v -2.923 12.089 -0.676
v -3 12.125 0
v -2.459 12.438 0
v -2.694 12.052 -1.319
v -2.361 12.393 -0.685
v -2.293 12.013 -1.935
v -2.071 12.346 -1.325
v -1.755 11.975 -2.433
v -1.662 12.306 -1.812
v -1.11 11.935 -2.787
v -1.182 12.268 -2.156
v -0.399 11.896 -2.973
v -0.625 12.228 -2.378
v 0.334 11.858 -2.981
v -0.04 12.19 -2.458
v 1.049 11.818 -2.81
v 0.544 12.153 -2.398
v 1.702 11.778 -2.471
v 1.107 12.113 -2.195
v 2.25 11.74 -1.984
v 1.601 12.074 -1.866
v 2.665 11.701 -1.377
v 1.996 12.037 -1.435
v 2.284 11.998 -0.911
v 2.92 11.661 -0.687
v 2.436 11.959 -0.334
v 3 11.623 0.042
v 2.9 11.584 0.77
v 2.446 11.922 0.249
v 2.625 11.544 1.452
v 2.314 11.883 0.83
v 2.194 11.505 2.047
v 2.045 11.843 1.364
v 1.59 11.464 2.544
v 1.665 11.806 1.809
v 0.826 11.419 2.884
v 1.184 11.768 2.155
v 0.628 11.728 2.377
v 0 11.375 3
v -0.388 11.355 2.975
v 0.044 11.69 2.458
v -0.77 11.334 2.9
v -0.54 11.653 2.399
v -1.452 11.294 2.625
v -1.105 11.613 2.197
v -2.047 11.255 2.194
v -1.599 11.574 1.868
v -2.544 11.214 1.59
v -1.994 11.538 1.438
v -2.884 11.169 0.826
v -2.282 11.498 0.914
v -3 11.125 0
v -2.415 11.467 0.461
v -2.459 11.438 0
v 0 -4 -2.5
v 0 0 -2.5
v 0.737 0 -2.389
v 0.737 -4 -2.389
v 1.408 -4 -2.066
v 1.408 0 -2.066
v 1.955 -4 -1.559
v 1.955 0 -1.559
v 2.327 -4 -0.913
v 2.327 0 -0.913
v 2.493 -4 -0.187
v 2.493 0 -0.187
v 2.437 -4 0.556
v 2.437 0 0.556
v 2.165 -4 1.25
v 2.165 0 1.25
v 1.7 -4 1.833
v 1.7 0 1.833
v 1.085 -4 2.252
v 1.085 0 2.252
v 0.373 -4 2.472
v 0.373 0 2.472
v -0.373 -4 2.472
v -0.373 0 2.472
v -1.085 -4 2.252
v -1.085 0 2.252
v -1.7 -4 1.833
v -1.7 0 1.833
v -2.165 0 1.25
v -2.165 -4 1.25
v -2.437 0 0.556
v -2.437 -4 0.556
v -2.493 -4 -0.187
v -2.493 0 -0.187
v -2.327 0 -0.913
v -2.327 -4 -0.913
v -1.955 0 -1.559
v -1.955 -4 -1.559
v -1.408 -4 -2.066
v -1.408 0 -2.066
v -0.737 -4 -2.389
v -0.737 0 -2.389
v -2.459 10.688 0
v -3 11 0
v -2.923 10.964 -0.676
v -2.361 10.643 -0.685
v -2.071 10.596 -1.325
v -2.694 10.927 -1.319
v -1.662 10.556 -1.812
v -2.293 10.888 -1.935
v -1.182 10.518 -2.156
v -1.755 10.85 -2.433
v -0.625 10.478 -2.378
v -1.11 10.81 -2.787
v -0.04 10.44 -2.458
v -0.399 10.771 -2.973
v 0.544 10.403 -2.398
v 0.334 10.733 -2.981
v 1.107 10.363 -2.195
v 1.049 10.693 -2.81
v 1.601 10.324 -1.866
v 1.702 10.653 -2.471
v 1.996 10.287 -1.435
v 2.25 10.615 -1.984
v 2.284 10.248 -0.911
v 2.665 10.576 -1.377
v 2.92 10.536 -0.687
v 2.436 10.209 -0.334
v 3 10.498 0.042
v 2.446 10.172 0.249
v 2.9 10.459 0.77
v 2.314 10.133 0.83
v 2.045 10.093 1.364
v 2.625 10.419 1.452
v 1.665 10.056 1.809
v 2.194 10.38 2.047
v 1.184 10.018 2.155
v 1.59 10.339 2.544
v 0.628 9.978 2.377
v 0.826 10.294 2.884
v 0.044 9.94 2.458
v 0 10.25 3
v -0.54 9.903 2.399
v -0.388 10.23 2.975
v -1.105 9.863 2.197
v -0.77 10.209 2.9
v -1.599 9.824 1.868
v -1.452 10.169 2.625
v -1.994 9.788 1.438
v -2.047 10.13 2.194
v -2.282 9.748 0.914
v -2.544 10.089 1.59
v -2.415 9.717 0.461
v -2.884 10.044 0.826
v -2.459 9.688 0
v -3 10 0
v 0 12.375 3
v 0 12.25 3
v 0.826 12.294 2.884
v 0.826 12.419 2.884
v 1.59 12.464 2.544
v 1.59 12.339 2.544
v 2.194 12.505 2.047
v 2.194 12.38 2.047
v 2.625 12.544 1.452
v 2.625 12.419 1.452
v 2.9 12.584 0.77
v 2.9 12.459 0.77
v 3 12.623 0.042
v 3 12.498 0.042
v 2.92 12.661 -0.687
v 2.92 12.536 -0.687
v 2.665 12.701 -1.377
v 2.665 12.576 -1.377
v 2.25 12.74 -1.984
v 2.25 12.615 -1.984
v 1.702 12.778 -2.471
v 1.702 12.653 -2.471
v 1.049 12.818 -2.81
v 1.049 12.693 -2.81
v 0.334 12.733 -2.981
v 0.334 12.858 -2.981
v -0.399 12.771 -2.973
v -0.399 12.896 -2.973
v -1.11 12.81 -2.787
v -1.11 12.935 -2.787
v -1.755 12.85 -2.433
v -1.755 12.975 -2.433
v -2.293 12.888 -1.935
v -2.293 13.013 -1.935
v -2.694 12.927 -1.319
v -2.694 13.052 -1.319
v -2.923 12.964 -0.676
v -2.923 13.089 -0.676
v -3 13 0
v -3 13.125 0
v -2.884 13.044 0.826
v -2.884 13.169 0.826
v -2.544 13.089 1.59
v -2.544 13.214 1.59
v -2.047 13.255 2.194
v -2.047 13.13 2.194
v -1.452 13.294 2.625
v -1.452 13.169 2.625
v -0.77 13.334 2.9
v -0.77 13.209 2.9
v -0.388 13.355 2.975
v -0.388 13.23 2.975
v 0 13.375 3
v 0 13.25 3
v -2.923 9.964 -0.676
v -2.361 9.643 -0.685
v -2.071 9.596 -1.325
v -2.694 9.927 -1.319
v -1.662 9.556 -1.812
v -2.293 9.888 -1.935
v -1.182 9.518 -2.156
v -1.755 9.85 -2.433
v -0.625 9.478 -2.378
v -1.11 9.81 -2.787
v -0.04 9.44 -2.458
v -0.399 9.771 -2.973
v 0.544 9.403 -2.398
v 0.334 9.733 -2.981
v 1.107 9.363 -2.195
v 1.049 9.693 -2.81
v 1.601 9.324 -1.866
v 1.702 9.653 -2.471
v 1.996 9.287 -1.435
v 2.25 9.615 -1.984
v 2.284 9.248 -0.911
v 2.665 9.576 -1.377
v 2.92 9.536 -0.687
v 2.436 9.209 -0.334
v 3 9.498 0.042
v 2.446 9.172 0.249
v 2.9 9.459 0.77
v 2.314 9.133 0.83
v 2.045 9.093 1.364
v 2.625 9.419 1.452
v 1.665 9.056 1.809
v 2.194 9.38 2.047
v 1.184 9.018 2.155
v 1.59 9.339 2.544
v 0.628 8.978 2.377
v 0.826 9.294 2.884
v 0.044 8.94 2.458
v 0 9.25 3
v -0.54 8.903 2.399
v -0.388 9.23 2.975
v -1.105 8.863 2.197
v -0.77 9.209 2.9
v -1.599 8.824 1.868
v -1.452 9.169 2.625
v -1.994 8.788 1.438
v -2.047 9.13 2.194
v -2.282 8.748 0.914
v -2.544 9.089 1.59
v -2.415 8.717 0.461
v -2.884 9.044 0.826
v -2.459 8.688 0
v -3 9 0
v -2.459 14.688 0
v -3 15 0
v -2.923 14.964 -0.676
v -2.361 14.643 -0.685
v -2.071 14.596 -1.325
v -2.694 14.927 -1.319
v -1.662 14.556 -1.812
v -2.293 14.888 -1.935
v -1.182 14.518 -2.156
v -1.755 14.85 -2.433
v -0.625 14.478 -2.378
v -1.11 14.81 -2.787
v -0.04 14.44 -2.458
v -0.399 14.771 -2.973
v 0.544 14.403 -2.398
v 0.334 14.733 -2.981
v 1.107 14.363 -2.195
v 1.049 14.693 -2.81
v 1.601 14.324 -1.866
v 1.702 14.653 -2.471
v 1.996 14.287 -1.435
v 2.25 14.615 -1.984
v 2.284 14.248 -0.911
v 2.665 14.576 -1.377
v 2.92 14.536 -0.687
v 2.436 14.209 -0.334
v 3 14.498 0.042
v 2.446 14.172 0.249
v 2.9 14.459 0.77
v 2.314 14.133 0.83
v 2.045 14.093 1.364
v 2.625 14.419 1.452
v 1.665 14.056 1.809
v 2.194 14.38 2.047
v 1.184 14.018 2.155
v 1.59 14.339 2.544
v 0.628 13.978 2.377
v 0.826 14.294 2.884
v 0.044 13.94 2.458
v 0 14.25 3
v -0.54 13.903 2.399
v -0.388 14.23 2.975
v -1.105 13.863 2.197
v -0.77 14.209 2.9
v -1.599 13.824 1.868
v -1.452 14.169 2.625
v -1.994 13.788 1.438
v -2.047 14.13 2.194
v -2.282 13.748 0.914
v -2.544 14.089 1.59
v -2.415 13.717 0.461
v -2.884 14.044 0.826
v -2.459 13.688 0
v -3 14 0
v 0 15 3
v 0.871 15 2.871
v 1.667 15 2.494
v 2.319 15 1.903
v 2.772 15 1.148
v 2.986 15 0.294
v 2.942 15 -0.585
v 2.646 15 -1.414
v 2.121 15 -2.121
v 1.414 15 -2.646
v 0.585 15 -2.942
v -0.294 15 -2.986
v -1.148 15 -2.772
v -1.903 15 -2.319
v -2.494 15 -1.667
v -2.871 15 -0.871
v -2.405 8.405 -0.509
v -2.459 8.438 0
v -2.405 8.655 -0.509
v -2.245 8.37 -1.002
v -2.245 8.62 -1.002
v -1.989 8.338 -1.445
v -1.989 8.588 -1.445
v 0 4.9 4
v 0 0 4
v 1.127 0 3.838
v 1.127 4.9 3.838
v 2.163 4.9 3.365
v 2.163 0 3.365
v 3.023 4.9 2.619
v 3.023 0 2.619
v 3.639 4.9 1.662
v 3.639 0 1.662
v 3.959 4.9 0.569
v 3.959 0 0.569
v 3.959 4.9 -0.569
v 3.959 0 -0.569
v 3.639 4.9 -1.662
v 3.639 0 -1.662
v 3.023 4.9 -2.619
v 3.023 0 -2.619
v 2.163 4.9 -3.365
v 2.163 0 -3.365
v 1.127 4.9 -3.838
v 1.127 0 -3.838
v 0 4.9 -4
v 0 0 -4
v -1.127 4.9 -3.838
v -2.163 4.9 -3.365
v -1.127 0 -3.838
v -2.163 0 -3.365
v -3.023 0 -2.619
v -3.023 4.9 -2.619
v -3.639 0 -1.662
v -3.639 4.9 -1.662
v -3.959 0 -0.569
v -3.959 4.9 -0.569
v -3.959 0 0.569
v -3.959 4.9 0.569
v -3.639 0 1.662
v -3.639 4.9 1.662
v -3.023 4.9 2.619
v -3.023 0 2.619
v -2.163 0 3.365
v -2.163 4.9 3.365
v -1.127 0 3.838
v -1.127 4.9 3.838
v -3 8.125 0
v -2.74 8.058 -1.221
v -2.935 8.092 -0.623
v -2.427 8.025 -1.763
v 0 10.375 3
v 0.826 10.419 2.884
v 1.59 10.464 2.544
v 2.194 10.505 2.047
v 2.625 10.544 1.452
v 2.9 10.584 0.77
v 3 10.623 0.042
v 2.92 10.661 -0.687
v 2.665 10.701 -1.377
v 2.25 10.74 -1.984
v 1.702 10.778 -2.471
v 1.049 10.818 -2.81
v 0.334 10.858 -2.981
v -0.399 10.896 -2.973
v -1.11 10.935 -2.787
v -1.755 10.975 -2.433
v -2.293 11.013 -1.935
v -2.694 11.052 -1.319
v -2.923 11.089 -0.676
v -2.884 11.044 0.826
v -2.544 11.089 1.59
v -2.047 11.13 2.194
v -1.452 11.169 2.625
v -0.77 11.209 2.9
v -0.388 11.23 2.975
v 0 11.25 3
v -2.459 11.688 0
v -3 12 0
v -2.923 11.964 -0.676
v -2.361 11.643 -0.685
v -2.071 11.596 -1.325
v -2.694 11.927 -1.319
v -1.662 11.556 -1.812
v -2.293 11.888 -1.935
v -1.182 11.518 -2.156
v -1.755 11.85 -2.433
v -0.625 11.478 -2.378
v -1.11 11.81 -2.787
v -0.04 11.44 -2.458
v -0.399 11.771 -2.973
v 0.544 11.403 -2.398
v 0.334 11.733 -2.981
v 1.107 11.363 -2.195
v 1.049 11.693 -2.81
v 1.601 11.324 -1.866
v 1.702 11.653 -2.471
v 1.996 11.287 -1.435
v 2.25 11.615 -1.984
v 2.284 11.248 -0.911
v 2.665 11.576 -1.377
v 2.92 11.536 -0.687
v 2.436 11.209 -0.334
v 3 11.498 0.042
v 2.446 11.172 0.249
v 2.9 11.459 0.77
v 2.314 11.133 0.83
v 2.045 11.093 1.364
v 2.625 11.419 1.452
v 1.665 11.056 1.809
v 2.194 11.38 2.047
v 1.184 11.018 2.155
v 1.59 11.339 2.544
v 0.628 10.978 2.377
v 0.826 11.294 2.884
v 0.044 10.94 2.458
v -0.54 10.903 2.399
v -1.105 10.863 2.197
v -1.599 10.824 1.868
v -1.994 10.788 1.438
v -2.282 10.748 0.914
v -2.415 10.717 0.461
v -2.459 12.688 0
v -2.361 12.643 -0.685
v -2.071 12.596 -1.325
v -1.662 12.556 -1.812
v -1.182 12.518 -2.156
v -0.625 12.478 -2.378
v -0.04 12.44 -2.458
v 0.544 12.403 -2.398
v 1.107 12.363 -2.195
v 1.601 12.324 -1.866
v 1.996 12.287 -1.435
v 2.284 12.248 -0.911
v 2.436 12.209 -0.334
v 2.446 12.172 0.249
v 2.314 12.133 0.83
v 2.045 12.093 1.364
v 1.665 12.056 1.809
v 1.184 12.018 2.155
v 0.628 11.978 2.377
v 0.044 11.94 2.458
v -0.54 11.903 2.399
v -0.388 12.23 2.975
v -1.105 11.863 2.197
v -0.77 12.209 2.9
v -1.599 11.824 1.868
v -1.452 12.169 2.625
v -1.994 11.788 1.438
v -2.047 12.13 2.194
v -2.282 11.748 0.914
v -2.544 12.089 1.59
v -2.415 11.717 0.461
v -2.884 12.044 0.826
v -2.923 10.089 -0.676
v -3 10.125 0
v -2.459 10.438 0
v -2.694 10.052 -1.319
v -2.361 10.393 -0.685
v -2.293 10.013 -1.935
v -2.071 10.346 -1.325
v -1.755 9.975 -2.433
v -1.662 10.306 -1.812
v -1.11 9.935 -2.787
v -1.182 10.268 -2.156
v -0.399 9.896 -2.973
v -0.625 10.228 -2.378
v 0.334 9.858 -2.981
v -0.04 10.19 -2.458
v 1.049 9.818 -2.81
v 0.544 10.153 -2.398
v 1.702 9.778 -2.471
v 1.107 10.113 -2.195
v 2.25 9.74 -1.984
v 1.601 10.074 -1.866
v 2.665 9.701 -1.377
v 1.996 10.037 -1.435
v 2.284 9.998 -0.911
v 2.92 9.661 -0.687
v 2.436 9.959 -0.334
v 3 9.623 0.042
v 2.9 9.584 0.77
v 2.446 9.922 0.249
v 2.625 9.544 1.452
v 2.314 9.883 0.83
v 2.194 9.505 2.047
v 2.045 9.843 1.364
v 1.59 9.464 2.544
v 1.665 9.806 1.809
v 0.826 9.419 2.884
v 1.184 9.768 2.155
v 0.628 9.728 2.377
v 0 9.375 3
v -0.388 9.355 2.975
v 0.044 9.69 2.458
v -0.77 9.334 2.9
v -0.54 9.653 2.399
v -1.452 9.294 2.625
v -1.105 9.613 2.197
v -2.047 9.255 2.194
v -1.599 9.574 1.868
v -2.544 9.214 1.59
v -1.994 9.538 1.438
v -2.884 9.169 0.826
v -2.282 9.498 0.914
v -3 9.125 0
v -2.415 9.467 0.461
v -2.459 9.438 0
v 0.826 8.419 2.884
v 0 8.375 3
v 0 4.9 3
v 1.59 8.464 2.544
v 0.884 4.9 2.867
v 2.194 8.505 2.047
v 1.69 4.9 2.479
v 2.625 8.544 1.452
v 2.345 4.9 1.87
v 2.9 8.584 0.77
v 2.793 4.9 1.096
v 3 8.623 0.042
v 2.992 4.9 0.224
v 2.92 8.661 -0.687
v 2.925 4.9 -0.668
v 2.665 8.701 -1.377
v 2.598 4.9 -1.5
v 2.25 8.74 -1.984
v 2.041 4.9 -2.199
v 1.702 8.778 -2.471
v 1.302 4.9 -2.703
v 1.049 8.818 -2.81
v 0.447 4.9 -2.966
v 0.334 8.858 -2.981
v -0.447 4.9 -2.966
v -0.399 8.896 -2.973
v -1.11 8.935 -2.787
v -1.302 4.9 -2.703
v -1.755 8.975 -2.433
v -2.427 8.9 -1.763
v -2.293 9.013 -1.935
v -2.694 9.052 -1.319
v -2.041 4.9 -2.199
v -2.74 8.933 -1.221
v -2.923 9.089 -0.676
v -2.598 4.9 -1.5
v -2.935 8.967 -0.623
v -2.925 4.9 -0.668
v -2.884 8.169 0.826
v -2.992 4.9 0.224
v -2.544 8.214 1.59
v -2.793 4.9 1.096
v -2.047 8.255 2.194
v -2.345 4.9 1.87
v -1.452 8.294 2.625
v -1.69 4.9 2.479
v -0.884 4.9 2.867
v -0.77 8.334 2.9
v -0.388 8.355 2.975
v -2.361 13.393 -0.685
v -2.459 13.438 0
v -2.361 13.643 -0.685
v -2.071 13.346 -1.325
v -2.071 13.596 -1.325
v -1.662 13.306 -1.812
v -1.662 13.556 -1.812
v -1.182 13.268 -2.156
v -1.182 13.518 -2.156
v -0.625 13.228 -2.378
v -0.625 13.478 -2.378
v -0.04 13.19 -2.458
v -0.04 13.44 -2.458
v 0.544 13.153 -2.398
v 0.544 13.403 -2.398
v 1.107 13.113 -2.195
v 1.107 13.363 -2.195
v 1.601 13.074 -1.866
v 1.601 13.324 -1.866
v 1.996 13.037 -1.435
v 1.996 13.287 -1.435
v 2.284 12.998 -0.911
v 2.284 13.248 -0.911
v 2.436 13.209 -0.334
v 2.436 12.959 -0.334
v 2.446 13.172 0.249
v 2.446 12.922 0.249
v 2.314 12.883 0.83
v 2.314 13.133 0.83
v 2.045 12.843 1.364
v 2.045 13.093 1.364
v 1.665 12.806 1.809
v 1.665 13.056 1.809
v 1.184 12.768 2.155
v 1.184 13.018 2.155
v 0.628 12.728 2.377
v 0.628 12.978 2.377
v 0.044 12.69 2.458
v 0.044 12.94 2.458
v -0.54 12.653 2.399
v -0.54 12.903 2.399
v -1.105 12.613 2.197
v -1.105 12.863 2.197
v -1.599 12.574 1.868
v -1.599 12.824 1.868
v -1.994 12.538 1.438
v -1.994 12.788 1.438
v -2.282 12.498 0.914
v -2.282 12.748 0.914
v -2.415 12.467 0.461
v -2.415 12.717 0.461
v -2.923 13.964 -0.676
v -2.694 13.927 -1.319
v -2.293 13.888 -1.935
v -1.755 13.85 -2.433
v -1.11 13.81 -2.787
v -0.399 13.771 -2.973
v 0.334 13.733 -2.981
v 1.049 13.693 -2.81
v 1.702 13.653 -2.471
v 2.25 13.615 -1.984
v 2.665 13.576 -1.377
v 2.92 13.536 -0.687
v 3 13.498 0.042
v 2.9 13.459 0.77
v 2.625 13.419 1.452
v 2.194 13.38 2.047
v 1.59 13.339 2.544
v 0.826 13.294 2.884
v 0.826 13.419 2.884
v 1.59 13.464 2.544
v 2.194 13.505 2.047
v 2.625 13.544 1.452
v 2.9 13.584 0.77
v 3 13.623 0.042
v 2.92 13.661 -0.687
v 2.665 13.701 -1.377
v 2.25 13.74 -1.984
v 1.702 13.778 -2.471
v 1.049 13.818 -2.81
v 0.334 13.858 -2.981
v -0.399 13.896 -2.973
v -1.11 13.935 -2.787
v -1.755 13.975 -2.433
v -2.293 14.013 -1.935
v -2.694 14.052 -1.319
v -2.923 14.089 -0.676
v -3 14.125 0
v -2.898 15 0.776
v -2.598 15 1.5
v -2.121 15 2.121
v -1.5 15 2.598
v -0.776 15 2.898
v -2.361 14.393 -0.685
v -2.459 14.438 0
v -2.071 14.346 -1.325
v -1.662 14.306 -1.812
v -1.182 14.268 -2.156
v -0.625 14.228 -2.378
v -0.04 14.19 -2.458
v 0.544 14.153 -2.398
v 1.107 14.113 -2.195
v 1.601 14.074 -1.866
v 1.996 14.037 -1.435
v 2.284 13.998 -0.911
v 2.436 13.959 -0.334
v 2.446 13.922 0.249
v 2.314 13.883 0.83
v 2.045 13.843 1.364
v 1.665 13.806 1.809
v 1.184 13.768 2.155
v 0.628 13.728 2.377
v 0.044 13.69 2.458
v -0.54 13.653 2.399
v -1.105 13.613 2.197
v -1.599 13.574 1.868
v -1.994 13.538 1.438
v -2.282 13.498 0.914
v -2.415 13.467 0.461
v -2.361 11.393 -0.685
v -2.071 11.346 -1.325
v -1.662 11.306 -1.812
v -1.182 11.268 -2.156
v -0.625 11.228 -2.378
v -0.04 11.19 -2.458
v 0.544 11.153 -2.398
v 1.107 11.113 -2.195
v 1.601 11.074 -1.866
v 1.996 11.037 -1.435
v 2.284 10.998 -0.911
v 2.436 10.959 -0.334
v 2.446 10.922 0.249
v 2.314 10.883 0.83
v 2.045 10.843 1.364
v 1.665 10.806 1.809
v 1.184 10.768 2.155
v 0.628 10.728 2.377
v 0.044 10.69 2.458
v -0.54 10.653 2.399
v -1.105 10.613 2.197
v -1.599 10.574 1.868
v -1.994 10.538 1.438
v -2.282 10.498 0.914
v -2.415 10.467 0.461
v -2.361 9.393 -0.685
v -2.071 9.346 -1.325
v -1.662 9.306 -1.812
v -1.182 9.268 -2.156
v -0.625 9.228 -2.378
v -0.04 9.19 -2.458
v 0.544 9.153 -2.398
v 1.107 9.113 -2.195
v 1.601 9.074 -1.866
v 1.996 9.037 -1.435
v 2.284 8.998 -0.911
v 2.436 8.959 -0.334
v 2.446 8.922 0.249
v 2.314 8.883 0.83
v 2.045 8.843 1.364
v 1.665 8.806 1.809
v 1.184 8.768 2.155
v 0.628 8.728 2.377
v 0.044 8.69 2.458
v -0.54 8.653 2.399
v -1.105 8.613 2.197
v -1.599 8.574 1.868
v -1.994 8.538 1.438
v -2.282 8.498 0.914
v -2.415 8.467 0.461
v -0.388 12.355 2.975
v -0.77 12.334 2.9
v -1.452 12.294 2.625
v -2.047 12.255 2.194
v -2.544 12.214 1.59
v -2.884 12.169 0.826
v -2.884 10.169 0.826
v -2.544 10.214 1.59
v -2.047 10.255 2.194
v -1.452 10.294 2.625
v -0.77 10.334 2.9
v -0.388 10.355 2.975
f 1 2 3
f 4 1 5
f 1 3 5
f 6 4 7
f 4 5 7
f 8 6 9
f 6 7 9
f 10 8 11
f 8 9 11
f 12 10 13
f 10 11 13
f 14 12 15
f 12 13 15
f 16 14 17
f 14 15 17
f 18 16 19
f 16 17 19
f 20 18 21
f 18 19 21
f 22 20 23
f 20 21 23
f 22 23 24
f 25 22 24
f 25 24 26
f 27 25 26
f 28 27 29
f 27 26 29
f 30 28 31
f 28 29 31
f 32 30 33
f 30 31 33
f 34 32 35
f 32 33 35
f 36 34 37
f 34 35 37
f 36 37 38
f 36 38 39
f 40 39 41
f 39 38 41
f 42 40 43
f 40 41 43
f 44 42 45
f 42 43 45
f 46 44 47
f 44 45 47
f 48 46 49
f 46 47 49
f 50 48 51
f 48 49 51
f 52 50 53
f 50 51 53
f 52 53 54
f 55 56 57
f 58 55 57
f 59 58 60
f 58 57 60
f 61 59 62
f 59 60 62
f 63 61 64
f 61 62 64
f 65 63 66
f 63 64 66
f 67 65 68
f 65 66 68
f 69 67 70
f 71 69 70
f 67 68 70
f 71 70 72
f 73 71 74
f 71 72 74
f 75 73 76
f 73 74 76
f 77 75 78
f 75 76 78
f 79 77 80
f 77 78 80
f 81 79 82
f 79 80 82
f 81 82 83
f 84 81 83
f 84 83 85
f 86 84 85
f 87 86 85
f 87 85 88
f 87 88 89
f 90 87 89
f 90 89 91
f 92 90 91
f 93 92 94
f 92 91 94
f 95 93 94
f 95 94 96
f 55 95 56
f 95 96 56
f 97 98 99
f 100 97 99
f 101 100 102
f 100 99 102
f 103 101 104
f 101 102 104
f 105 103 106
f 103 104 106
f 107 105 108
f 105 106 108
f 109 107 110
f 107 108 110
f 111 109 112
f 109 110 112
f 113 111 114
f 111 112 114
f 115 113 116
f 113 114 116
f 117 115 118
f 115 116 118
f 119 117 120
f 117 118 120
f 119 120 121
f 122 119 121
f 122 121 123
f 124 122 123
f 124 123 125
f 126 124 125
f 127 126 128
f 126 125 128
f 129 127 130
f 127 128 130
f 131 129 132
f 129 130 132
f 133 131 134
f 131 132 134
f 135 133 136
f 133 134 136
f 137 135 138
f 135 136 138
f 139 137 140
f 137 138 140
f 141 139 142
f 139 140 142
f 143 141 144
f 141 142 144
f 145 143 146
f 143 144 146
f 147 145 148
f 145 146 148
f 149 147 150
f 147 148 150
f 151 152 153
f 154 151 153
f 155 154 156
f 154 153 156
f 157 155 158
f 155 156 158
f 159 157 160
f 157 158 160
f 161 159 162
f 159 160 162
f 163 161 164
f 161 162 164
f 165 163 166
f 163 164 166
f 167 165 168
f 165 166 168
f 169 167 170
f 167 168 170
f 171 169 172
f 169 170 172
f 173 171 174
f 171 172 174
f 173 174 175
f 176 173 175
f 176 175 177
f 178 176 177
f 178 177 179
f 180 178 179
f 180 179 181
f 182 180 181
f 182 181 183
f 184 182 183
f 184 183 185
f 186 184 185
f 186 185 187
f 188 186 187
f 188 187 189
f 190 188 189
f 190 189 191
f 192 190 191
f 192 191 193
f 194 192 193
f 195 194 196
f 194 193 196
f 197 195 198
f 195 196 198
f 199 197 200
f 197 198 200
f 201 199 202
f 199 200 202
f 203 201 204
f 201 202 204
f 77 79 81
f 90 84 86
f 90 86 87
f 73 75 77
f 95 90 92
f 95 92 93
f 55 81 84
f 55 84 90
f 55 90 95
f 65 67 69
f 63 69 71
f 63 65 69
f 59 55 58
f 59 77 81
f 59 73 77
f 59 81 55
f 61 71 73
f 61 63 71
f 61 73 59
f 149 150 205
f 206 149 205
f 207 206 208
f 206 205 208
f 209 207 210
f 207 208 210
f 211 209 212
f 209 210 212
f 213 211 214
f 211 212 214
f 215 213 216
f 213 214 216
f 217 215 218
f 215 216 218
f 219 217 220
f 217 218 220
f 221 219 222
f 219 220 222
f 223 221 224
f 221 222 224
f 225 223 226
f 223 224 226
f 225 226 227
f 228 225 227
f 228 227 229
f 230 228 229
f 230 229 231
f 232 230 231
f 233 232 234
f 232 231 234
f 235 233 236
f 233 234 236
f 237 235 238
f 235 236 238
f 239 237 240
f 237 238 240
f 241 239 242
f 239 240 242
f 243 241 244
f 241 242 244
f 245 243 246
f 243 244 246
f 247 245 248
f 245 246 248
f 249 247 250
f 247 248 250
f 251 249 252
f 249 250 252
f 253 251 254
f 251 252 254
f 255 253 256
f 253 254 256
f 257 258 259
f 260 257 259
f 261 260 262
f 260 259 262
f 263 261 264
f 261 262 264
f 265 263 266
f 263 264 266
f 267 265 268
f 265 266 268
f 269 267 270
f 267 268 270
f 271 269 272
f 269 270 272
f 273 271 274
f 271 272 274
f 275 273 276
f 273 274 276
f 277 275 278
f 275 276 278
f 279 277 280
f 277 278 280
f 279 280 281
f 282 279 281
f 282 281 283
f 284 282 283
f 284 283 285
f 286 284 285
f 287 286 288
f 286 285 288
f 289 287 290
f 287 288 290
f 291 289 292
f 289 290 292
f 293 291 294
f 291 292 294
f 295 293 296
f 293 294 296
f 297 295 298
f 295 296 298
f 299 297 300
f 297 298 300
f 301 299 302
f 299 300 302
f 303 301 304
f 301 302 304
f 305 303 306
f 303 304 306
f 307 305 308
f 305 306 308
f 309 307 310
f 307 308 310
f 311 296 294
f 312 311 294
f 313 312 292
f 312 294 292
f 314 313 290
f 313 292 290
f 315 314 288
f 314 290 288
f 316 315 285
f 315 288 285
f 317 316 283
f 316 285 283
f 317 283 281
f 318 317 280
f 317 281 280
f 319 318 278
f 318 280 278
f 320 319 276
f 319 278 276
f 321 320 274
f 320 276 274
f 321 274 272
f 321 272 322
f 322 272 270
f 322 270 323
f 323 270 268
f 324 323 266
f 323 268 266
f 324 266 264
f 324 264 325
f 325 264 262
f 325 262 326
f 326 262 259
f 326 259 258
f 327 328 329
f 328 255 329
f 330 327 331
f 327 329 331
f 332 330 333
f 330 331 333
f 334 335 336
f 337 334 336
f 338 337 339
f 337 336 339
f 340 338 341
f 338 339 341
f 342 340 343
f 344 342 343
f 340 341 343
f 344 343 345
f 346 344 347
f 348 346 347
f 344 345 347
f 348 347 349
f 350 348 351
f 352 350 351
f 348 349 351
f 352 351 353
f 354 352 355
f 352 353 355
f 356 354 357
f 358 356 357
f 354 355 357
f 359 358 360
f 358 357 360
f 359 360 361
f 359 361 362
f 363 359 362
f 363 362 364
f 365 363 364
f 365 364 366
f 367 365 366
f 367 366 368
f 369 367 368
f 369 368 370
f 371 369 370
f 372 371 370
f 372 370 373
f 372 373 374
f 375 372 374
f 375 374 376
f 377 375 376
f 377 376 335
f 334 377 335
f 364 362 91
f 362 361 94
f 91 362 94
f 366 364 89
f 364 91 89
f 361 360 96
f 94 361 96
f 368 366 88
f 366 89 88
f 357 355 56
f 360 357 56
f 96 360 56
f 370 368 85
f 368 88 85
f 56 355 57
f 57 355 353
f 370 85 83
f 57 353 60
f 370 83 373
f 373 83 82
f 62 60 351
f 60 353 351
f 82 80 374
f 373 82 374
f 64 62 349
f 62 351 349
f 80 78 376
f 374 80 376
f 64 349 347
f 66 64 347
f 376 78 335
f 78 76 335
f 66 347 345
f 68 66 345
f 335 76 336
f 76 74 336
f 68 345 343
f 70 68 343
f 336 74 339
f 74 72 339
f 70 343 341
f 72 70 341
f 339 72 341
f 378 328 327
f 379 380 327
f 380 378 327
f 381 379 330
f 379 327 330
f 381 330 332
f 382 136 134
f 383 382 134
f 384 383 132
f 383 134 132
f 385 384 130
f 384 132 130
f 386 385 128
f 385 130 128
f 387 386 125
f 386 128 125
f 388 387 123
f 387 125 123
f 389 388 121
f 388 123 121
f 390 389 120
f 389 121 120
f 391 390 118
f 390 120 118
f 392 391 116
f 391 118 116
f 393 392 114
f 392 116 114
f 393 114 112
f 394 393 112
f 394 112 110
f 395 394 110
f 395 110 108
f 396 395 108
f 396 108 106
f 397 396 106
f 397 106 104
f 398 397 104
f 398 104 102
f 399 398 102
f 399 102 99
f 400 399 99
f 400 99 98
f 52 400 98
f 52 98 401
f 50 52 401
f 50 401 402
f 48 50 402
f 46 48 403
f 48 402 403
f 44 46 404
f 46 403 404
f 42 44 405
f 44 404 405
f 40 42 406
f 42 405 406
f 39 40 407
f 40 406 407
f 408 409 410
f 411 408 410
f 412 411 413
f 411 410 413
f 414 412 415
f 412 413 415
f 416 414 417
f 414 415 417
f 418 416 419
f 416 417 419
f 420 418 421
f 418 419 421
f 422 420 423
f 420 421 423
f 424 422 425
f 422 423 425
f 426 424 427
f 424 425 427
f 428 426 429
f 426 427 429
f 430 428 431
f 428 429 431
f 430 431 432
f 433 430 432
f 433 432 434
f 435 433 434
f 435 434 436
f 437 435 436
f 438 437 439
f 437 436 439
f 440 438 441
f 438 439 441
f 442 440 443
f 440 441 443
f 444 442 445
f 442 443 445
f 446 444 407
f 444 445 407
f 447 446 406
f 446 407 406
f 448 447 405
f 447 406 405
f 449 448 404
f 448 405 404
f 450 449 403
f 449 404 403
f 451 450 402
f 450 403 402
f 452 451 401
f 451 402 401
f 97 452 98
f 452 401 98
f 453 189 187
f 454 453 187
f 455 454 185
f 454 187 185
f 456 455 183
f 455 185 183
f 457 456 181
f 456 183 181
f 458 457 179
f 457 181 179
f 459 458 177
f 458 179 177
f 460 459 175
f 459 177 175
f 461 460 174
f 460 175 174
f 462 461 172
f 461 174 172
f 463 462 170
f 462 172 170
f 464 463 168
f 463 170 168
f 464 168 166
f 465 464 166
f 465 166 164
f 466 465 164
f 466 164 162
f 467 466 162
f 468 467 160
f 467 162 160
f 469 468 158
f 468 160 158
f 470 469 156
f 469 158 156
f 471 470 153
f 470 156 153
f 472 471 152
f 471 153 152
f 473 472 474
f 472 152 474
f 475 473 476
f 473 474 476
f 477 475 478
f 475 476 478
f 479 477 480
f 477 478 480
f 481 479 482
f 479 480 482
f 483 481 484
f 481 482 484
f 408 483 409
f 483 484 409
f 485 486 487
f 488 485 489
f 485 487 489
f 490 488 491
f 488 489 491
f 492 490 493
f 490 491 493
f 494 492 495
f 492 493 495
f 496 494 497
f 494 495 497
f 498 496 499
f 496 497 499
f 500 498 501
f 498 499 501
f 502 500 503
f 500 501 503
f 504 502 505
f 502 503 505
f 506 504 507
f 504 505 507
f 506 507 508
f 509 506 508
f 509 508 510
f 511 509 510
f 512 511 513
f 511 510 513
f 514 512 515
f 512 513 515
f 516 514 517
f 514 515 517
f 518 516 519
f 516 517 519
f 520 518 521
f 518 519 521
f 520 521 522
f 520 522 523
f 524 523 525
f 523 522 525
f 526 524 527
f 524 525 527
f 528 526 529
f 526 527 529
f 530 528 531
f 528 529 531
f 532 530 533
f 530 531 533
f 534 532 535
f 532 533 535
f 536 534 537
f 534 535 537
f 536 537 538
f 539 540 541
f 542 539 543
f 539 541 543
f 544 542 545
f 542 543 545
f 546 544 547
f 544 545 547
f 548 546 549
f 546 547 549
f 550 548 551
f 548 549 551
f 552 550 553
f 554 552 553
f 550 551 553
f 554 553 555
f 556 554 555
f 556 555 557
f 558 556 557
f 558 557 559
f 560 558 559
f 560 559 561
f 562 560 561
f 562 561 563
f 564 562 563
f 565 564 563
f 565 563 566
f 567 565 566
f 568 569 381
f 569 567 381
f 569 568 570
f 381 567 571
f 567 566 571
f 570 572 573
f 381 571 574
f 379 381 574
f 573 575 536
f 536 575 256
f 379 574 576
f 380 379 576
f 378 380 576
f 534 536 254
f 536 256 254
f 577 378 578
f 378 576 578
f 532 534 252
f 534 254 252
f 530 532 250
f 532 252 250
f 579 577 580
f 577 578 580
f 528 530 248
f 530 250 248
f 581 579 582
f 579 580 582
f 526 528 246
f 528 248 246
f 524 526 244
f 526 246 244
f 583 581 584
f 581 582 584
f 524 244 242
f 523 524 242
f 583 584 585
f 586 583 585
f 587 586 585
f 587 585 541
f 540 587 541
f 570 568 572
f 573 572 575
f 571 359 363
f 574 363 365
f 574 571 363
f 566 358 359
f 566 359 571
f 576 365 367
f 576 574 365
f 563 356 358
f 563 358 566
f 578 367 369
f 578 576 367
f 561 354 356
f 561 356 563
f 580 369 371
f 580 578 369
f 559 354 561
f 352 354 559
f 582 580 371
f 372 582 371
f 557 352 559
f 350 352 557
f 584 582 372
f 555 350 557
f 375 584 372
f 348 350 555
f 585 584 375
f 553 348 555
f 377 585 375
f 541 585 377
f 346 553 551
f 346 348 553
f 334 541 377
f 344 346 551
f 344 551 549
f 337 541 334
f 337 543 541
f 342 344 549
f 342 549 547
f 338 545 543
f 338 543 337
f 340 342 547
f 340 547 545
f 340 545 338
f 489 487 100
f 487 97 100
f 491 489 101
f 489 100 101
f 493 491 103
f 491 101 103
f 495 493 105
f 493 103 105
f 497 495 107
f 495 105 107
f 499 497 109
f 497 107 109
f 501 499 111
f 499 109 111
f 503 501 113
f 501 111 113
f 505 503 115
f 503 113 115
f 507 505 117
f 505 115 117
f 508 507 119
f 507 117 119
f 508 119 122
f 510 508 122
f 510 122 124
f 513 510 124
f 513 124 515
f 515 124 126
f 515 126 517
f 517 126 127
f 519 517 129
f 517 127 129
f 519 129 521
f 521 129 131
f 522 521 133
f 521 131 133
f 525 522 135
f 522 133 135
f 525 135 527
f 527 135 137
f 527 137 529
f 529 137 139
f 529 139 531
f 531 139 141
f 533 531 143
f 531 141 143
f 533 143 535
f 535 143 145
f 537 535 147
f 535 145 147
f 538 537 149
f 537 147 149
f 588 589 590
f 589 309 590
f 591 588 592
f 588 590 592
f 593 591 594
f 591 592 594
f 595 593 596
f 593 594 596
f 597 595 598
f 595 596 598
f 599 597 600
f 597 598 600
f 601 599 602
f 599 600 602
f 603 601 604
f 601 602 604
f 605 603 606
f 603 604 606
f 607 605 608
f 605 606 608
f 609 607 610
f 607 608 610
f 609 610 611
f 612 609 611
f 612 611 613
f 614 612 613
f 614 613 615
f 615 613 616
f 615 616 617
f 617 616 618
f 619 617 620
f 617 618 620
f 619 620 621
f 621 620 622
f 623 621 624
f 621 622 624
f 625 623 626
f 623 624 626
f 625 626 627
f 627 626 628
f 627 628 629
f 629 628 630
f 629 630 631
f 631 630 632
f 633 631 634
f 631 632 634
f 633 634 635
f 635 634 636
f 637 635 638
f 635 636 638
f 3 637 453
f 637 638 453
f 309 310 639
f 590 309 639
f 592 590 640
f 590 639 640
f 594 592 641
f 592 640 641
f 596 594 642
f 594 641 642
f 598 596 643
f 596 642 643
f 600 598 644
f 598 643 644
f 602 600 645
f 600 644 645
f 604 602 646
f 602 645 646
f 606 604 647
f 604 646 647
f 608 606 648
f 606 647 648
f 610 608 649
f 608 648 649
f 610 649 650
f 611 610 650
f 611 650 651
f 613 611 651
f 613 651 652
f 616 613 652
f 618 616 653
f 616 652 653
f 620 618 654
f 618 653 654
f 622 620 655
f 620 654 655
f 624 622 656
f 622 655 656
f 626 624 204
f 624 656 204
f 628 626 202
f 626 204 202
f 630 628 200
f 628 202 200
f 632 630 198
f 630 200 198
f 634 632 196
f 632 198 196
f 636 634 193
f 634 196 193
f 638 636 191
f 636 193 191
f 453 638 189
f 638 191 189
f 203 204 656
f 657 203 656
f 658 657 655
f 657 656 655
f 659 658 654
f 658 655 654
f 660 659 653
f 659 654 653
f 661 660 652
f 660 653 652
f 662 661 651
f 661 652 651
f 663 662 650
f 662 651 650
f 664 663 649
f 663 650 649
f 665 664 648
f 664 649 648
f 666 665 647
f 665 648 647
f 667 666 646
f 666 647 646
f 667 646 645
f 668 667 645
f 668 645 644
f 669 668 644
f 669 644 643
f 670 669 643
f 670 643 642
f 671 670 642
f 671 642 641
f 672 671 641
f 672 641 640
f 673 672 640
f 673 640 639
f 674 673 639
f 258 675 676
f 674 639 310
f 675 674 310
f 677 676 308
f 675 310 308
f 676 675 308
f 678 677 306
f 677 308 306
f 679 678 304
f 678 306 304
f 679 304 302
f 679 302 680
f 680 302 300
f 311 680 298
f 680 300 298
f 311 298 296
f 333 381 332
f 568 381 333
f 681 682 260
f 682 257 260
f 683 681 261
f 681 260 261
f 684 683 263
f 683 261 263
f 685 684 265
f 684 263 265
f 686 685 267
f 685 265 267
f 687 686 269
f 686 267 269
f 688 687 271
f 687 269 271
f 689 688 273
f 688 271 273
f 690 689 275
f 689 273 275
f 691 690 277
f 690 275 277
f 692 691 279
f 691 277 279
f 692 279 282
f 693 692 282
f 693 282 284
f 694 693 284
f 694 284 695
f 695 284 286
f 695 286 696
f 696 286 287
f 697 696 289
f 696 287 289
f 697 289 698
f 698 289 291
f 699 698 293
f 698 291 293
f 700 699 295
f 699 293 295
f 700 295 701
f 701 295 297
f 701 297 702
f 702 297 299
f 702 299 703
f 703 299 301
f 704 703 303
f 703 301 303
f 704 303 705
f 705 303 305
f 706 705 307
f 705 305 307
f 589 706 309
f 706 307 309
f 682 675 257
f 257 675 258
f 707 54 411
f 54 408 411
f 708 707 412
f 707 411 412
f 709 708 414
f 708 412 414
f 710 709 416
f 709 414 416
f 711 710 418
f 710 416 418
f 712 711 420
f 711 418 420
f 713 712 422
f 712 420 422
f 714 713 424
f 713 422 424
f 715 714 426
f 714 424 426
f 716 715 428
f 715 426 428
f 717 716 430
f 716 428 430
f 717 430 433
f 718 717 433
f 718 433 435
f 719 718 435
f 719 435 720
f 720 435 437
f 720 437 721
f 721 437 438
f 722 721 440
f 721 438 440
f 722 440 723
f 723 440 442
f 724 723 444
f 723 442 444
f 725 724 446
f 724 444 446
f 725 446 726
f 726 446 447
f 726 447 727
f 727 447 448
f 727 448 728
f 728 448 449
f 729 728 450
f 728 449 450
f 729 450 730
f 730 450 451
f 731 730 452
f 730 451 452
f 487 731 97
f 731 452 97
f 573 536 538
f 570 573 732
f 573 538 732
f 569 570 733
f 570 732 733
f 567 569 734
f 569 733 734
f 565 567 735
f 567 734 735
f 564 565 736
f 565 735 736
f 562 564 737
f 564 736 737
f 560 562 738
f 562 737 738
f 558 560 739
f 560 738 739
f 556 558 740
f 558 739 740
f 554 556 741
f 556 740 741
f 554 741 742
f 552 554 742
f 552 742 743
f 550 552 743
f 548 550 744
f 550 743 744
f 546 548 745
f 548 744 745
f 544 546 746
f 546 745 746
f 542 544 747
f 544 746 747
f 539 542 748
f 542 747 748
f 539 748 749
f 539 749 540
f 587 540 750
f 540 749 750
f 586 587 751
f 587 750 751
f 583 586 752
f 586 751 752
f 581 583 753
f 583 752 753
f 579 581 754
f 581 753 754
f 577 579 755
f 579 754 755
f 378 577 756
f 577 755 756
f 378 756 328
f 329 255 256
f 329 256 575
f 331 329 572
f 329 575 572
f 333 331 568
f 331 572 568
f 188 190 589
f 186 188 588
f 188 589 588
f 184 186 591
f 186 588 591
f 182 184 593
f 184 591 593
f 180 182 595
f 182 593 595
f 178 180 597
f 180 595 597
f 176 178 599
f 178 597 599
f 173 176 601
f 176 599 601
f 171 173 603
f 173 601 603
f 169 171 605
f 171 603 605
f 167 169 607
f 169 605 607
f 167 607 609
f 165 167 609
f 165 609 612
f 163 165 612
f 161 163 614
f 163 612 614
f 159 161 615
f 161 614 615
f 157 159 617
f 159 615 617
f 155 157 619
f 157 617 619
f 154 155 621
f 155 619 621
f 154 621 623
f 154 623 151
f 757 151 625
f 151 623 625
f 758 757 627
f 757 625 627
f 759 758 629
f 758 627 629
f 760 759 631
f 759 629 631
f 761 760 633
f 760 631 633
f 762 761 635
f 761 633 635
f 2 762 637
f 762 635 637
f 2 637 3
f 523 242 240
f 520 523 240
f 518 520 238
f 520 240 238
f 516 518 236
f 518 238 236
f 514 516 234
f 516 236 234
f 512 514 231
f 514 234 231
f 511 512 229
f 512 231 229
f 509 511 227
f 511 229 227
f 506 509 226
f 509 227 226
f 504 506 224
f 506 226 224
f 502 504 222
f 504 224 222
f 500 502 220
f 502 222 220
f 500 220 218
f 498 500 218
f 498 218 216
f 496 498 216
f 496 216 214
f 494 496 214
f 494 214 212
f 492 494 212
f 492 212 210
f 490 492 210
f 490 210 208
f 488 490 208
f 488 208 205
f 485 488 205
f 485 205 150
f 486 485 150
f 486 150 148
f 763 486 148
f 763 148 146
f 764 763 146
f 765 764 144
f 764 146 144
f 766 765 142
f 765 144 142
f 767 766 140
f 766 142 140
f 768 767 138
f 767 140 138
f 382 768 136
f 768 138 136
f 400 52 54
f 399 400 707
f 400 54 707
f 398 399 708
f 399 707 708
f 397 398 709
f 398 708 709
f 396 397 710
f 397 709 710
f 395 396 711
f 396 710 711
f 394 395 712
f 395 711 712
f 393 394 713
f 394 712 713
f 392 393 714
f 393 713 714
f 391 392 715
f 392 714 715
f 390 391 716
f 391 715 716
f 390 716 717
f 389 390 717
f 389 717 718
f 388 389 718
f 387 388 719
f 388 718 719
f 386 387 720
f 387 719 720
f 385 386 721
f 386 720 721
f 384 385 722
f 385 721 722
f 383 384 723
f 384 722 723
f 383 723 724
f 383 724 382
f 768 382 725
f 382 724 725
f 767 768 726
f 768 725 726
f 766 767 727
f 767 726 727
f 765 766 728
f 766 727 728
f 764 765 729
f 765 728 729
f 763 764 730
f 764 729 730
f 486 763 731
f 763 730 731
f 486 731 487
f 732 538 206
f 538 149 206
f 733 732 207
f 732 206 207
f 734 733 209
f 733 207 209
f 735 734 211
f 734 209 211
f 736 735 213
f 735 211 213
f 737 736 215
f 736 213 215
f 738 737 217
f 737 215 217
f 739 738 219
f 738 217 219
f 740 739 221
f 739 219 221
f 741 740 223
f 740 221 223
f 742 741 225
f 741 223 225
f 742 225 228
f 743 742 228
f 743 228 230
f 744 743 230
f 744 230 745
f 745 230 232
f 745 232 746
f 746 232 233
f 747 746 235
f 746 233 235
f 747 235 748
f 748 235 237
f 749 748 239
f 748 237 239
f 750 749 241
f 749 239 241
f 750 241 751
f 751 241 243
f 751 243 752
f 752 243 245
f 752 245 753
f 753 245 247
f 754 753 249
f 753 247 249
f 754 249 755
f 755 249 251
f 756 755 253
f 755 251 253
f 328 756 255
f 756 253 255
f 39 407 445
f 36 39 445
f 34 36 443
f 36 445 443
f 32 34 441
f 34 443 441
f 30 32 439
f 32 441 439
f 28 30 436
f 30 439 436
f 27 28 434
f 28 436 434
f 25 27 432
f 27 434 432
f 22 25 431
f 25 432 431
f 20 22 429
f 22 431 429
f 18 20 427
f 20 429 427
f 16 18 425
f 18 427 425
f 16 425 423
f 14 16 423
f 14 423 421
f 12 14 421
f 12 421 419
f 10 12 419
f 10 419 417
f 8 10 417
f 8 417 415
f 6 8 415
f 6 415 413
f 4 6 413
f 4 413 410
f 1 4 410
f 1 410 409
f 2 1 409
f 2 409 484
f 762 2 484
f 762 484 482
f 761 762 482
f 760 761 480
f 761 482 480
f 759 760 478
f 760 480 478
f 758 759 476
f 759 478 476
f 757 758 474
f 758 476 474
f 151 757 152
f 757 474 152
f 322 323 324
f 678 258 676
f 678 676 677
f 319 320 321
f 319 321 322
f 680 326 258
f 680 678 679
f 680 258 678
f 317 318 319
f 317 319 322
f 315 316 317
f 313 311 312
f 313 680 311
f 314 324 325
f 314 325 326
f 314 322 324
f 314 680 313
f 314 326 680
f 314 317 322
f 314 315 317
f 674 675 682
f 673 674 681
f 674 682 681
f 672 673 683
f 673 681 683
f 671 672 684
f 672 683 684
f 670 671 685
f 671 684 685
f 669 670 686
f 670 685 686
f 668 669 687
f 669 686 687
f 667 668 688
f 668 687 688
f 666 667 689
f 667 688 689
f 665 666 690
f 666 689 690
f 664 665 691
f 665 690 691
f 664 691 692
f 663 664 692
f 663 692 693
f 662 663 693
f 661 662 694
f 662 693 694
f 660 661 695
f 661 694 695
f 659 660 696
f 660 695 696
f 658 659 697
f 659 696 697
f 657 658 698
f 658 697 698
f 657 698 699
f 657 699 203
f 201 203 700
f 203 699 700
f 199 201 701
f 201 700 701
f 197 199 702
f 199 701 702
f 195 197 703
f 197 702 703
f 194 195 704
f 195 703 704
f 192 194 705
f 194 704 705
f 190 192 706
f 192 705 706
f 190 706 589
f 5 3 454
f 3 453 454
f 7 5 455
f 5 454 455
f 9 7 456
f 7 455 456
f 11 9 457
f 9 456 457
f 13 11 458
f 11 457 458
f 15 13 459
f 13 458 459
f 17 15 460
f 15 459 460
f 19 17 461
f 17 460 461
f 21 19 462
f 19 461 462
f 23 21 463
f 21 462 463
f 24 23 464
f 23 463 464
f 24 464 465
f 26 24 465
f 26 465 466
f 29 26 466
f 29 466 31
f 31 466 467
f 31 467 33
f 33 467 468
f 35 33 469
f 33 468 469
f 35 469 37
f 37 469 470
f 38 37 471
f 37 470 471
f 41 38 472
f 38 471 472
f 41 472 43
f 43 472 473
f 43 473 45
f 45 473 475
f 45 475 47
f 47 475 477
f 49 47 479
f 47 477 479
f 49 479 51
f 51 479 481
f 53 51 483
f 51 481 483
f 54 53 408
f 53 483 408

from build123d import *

# Parameters (mm, degrees)
SKETCH1_R           = 4
BOSS_EXTRUDE1_DEPTH = 15
CUT_EXTRUDE1_START  = -10.1
SKETCH2_R           = 4
SKETCH2_R_2         = 3
CUT_EXTRUDE1_DEPTH  = 10.1
THREAD1_PITCH       = 1
SKETCH3_R           = 2.5
BOSS_EXTRUDE2_DEPTH = 4


with BuildPart() as part:
    # Sketch1 → Boss-Extrude1 (new body)
    with BuildSketch(Plane(origin=(0, 0, 0), x_dir=(1, 0, 0), z_dir=(0, 1, 0))):
        with Locations(Location((0, 0, 0), (0, 0, 270))):
            Circle(SKETCH1_R)
    extrude(amount=BOSS_EXTRUDE1_DEPTH)

    # Sketch2 → Cut-Extrude1 (cut)
    with BuildSketch(Plane(origin=(0, 15, 0), x_dir=(1, 0, 0), z_dir=(0, 1, 0)).offset(CUT_EXTRUDE1_START)):
        with Locations(Location((0, 0, 0), (0, 0, 270))):
            Circle(SKETCH2_R)
        with Locations(Location((0, 0, 0), (0, 0, 270))):
            Circle(SKETCH2_R_2, mode=Mode.SUBTRACT)
    extrude(amount=CUT_EXTRUDE1_DEPTH, mode=Mode.SUBTRACT)

    # Thread1: the profile of Thread Profile1 profile screwed along a right-hand helix of 6.1 turns, 8 arcs to a turn; built about Z, then put on its axis
    thread1_z = Axis((0, 0, 0), (0, 0, 1))
    thread1_corners = [(3.0003, 0, -0.000173205), (3.0003, 0, 0.875173202), (2.458734125, 0, 0.562499999), (2.458734125, 0, 0.312499999)]
    with BuildLine(mode=Mode.PRIVATE) as thread1_profile:
        Line(thread1_corners[0], thread1_corners[1])
        Line(thread1_corners[1], thread1_corners[2])
        Line(thread1_corners[2], thread1_corners[3])
        Line(thread1_corners[3], thread1_corners[0])
    thread1_cap = Face(thread1_profile.wire())
    thread1_turn_angles = [0, 22.5, 45, 67.5, 90, 112.5, 135, 157.5, 180, 202.5, 225, 247.5, 270, 292.5, 315, 337.5, 360]
    thread1_turn_weights = [1, 0.9238795325112867, 1, 0.9238795325112867, 1, 0.9238795325112867, 1, 0.9238795325112867, 1, 0.9238795325112867, 1, 0.9238795325112867, 1, 0.9238795325112867, 1, 0.9238795325112867, 1]
    thread1_turn_rails = [Edge.make_bspline([Vector(p[0], p[1], 0).rotate(thread1_z, thread1_turn_angles[k]) / thread1_turn_weights[k] + Vector(0, 0, p[2] + THREAD1_PITCH * thread1_turn_angles[k] / 360) for k in range(17)], [0, 0, 0, 1, 1, 2, 2, 3, 3, 4, 4, 5, 5, 6, 6, 7, 7, 8, 8, 8], 2, thread1_turn_weights) for p in thread1_corners]
    thread1_turn_sides = [Face.make_surface_from_curves(thread1_turn_rails[p[0]], thread1_turn_rails[p[1]]) for p in [(0, 1), (1, 2), (2, 3), (3, 0)]]
    thread1_last_angles = [2160, 2178, 2196]
    thread1_last_weights = [1, 0.9510565162951535, 1]
    thread1_last_rails = [Edge.make_bspline([Vector(p[0], p[1], 0).rotate(thread1_z, thread1_last_angles[k]) / thread1_last_weights[k] + Vector(0, 0, p[2] + THREAD1_PITCH * thread1_last_angles[k] / 360) for k in range(3)], [0, 0, 0, 1, 1, 1], 2, thread1_last_weights) for p in thread1_corners]
    thread1_last_sides = [Face.make_surface_from_curves(thread1_last_rails[p[0]], thread1_last_rails[p[1]]) for p in [(0, 1), (1, 2), (2, 3), (3, 0)]]
    thread1 = Plane(origin=(0, 15, 0), x_dir=(-1, 0, 0), z_dir=(0, -1, 0)) * Solid(Shell([*[p.moved(Location((0, 0, THREAD1_PITCH * i))) for i in range(6) for p in thread1_turn_sides], *thread1_last_sides, thread1_cap, thread1_cap.rotate(thread1_z, 2196).moved(Location((0, 0, THREAD1_PITCH * 2196 / 360)))]))
    add(thread1, mode=Mode.SUBTRACT)

    # Sketch3 → Boss-Extrude2 (add)
    with BuildSketch(Plane.XZ):
        with Locations(Location((0, 0, 0), (0, 0, 270))):
            Circle(SKETCH3_R)
    extrude(amount=BOSS_EXTRUDE2_DEPTH)


solid = part.part
